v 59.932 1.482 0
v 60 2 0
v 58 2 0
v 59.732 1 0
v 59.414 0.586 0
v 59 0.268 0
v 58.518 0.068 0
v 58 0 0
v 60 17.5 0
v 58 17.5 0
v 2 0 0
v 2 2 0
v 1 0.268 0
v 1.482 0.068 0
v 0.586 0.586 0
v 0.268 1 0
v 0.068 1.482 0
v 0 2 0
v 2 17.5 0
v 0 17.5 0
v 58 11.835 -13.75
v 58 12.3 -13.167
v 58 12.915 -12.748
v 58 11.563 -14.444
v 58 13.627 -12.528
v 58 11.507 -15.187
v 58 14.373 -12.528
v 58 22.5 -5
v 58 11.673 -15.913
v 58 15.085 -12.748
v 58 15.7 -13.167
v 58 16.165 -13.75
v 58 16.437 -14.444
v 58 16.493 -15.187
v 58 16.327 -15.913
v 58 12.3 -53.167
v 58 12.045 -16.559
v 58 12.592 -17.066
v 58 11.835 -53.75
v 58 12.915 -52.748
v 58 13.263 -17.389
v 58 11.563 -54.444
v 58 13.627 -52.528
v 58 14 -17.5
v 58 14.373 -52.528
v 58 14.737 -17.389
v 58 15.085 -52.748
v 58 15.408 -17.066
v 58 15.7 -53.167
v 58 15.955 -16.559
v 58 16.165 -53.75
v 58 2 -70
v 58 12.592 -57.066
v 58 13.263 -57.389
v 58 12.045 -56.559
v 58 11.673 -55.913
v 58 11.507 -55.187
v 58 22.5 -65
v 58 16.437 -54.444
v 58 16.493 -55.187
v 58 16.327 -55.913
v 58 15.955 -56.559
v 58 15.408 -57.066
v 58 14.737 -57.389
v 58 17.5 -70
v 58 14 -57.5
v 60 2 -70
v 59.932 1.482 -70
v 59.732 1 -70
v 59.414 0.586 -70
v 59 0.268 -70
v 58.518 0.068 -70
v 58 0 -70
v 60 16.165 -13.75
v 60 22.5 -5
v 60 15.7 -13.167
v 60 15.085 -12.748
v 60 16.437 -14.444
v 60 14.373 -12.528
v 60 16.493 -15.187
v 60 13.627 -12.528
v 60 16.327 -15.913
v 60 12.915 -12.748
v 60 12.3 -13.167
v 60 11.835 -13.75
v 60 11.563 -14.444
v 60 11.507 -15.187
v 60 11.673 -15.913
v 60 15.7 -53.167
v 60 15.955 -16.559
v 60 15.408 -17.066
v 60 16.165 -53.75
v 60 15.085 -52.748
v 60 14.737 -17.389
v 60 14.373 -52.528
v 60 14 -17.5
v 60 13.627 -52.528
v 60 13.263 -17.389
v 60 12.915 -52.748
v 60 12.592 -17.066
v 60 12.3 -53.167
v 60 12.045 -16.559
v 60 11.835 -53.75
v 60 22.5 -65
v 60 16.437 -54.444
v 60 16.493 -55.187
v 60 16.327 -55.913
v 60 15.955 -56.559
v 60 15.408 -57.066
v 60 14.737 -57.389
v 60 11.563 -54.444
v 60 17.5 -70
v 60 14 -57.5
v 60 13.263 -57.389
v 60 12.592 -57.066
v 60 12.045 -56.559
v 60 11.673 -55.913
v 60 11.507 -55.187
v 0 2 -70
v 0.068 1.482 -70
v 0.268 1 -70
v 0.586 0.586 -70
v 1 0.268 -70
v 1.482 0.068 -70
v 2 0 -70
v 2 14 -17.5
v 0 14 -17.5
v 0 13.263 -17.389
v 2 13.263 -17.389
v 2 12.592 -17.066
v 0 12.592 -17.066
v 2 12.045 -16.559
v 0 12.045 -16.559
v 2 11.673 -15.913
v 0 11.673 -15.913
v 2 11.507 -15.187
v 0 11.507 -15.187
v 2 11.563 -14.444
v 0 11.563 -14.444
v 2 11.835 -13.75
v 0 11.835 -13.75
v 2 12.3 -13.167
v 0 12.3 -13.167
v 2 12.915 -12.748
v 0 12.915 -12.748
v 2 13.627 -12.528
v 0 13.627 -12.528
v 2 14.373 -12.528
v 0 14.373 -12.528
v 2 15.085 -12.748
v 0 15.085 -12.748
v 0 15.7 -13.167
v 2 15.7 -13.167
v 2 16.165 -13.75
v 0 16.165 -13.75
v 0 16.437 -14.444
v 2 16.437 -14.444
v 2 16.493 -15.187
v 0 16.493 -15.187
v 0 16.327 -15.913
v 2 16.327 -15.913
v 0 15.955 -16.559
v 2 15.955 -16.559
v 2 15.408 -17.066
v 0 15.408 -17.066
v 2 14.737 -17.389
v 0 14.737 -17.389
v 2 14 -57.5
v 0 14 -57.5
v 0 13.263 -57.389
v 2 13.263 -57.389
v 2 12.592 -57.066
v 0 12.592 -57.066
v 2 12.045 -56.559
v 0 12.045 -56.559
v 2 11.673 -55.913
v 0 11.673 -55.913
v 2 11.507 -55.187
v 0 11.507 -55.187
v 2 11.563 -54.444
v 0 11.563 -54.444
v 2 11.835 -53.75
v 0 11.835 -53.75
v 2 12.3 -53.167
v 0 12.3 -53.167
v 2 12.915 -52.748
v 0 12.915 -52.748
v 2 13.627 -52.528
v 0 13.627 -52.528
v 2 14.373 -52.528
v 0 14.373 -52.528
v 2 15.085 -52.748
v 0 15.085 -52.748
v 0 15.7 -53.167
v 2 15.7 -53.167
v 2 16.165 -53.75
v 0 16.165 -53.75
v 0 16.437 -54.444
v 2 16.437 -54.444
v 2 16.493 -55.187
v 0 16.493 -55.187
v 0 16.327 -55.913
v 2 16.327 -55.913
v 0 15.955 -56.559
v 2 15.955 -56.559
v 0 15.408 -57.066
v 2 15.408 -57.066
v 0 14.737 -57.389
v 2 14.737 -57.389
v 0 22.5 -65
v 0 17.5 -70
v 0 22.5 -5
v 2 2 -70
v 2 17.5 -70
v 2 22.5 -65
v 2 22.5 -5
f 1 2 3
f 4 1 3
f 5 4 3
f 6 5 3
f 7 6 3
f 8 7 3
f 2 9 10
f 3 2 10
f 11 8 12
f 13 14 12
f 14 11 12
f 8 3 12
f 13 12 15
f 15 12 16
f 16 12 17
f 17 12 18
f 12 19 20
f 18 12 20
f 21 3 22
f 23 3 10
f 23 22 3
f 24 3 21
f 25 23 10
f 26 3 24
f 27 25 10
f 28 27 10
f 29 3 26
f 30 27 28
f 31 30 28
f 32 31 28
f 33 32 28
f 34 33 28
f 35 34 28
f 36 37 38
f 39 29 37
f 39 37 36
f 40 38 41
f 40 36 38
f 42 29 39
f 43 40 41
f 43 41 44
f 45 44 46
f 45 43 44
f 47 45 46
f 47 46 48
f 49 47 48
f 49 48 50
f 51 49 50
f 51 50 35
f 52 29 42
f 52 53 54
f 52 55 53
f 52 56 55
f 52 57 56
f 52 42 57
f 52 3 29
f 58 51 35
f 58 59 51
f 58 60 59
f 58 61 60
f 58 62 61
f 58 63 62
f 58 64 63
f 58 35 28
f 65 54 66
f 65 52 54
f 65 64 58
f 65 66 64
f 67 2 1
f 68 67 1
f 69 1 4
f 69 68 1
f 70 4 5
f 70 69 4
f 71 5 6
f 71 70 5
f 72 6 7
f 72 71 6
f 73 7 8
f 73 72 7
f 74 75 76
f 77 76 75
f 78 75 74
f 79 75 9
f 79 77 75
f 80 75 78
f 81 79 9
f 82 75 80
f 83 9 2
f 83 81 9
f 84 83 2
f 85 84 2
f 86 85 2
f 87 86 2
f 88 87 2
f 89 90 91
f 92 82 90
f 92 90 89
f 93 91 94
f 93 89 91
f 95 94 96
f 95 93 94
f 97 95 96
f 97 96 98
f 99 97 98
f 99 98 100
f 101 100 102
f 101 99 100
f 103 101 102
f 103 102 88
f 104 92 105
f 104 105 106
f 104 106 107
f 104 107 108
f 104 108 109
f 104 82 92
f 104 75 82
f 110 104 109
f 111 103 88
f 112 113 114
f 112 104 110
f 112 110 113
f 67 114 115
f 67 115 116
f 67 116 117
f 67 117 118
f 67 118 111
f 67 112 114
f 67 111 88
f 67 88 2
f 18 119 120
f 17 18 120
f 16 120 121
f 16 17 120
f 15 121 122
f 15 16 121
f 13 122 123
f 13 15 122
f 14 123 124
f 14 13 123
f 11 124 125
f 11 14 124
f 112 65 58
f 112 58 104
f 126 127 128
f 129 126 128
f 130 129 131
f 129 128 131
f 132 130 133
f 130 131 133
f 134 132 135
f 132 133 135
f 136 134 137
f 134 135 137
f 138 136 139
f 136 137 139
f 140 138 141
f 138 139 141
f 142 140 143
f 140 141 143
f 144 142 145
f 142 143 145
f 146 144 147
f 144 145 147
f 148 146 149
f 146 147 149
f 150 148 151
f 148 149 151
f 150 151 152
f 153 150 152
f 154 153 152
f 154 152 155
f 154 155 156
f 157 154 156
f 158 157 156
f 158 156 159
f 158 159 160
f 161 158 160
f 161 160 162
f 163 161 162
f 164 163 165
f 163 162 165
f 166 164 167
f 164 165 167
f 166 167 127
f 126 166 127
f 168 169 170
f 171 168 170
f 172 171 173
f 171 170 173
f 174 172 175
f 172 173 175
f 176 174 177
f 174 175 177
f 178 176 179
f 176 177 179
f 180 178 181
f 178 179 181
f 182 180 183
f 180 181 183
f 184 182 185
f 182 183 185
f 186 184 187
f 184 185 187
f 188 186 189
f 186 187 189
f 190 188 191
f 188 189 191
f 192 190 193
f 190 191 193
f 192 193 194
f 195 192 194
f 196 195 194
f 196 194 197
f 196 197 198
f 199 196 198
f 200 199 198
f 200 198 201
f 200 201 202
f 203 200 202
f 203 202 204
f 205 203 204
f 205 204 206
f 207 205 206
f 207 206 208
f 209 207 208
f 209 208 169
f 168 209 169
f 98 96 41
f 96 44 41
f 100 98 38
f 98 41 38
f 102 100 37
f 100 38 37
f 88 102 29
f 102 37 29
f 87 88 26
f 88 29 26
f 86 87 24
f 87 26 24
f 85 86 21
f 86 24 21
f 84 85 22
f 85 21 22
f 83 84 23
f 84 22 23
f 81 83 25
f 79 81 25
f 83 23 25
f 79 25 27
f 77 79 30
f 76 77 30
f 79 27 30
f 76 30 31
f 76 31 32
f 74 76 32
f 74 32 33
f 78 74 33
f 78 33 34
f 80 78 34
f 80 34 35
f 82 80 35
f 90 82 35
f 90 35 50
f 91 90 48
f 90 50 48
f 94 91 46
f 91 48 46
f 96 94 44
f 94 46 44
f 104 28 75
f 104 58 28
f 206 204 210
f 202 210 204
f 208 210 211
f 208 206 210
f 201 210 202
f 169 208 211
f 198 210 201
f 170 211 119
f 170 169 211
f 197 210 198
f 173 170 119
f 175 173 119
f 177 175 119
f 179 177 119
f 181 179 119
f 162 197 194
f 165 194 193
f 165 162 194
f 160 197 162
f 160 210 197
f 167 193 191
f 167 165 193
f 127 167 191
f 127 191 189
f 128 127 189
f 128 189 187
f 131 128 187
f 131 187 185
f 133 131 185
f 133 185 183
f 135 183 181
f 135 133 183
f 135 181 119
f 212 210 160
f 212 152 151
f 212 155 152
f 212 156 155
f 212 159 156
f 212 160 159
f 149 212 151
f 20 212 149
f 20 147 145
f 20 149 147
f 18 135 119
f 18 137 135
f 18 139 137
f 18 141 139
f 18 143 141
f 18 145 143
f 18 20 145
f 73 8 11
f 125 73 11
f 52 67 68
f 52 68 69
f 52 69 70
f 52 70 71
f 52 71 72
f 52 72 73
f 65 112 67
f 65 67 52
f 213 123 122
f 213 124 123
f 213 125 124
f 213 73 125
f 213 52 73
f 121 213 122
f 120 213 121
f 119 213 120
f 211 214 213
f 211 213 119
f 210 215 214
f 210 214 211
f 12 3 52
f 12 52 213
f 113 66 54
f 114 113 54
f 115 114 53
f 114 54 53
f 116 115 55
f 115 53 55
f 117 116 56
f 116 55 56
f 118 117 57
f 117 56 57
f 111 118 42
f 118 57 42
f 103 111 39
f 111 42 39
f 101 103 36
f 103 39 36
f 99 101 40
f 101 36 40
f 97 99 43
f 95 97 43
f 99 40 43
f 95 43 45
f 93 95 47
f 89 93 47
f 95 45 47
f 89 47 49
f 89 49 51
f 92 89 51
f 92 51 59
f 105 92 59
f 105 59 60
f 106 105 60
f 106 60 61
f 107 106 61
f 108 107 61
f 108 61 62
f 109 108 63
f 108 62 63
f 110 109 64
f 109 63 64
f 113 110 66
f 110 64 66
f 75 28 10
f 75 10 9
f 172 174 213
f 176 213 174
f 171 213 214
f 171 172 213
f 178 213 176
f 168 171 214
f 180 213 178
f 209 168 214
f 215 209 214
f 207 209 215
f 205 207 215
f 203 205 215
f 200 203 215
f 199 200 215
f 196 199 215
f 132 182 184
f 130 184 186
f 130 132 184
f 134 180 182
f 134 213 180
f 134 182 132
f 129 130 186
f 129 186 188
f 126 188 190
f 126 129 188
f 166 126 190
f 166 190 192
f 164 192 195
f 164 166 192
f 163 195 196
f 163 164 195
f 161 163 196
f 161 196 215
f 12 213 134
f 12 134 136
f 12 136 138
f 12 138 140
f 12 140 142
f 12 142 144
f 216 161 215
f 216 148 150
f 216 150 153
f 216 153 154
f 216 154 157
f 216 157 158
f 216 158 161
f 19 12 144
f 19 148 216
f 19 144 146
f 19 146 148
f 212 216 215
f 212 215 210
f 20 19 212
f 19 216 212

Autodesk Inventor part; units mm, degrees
ref_plane "YZ Plane" through (0, 0, 0) normal (1, 0, 0) x (0, 1, 0)
ref_plane "XZ Plane" through (0, 0, 0) normal (0, 1, 0) x (-1, 0, 0)
ref_plane "XY Plane" through (0, 0, 0) normal (0, 0, 1) x (1, 0, 0)
sketch "草圖1" plane through (0, 0, 0) normal (0, 1, 0) x (-1, 0, 0)
  line L0 (0, 0) -> (-60, 0)
  line L1 (-60, 0) -> (-60, -70)
  line L2 (-60, -70) -> (0, -70)
  line L3 (0, -70) -> (0, 0)
  dimension "d0" = 60
  dimension "d1" = 70
extrude "平板1" add sketch "草圖1" along normal blind 2
sketch "草圖2" plane through (2, 0, 0) normal (-1, 0, 0) x (0, -1, 0)
  line L0 (0, -70) -> (0, 0)
  line L1 (0, 0) -> (-22.5, 0)
  line L2 (-22.5, 0) -> (-22.5, -70)
  line L3 (-22.5, -70) -> (0, -70)
edge flange "凸緣1" height 22.5 angle 90 thickness 2 bend radius 0 thickness toward (-1, 0, 0) relief straight relief width 2 relief depth 1 edges at (0, 2, -35) wall of the first edge with corners at (2, 0, -70) (2, 0, 0) (2, 22.5, 0) (2, 22.5, -70)
bend "折彎1"
corner "轉角1"
sketch "草圖3" plane through (58, 0, -70) normal (1, 0, 0) x (0, 1, 0)
  line L0 (0, 70) -> (0, 0)
  line L1 (0, 0) -> (22.5, 0)
  line L2 (22.5, 0) -> (22.5, 70)
  line L3 (22.5, 70) -> (0, 70)
edge flange "凸緣2" height 22.5 angle 90 thickness 2 bend radius 0 thickness toward (1, 0, 0) relief straight relief width 2 relief depth 1 edges at (60, 2, -35) wall of the first edge with corners at (58, 0, 0) (58, 0, -70) (58, 22.5, -70) (58, 22.5, 0)
bend "折彎2"
corner "轉角2"
chamfer "轉角倒角1" distance 5 angle 45 4 edges at (1, 22.5, -70) (1, 22.5, 0) (59, 22.5, -70) (59, 22.5, 0)
sketch "草圖4" plane through (60, 2.001, 0) normal (1, 0, 0) x (0, 0, -1)
  line L0 (15, 11.999) -> (55, 11.999)
  line L1 (70, -2.001) -> (0, -2.001) projected
  line L2 (0, 0) -> (0, 15.499) projected
  dimension "d26" = 40
  dimension "d27" = 14
  dimension "d28" = 15
hole "孔1" at (60, 14, -15) at (60, 14, -55) direction (-1, 0, 0) diameter 5 depth 80 tip angle 118
equation "\"d3\" = 折彎離隙寬度"
equation "\"d4\" = 折彎離隙深度"
equation "\"d5\" = 最小剩餘"
equation "\"d6\" = 折彎半徑"
equation "\"d10\" = 轉角離隙大小"
equation "\"d11\" = 間隙大小"
equation "\"d12\" = Jacobi半徑大小"
equation "\"d13\" = 折彎離隙寬度"
equation "\"d14\" = 折彎離隙深度"
equation "\"d15\" = 最小剩餘"
equation "\"d16\" = 折彎半徑"
equation "\"d20\" = 轉角離隙大小"
equation "\"d21\" = 間隙大小"
equation "\"d22\" = Jacobi半徑大小"
equation "\"折彎半徑\" = 厚度"
equation "\"折彎離隙寬度\" = 厚度"
equation "\"折彎離隙深度\" = 0.5 * 厚度"
equation "\"轉角離隙大小\" = 4 * 厚度"
equation "\"最小剩餘\" = 2 * 厚度"
equation "\"轉移半徑\" = 折彎半徑"
equation "\"Jacobi半徑大小\" = 厚度"
equation "\"間隙大小\" = 厚度"
equation "\"d2\" = 折彎半徑"
equation "\"厚度\" = 2"
properties part number "4-4"
